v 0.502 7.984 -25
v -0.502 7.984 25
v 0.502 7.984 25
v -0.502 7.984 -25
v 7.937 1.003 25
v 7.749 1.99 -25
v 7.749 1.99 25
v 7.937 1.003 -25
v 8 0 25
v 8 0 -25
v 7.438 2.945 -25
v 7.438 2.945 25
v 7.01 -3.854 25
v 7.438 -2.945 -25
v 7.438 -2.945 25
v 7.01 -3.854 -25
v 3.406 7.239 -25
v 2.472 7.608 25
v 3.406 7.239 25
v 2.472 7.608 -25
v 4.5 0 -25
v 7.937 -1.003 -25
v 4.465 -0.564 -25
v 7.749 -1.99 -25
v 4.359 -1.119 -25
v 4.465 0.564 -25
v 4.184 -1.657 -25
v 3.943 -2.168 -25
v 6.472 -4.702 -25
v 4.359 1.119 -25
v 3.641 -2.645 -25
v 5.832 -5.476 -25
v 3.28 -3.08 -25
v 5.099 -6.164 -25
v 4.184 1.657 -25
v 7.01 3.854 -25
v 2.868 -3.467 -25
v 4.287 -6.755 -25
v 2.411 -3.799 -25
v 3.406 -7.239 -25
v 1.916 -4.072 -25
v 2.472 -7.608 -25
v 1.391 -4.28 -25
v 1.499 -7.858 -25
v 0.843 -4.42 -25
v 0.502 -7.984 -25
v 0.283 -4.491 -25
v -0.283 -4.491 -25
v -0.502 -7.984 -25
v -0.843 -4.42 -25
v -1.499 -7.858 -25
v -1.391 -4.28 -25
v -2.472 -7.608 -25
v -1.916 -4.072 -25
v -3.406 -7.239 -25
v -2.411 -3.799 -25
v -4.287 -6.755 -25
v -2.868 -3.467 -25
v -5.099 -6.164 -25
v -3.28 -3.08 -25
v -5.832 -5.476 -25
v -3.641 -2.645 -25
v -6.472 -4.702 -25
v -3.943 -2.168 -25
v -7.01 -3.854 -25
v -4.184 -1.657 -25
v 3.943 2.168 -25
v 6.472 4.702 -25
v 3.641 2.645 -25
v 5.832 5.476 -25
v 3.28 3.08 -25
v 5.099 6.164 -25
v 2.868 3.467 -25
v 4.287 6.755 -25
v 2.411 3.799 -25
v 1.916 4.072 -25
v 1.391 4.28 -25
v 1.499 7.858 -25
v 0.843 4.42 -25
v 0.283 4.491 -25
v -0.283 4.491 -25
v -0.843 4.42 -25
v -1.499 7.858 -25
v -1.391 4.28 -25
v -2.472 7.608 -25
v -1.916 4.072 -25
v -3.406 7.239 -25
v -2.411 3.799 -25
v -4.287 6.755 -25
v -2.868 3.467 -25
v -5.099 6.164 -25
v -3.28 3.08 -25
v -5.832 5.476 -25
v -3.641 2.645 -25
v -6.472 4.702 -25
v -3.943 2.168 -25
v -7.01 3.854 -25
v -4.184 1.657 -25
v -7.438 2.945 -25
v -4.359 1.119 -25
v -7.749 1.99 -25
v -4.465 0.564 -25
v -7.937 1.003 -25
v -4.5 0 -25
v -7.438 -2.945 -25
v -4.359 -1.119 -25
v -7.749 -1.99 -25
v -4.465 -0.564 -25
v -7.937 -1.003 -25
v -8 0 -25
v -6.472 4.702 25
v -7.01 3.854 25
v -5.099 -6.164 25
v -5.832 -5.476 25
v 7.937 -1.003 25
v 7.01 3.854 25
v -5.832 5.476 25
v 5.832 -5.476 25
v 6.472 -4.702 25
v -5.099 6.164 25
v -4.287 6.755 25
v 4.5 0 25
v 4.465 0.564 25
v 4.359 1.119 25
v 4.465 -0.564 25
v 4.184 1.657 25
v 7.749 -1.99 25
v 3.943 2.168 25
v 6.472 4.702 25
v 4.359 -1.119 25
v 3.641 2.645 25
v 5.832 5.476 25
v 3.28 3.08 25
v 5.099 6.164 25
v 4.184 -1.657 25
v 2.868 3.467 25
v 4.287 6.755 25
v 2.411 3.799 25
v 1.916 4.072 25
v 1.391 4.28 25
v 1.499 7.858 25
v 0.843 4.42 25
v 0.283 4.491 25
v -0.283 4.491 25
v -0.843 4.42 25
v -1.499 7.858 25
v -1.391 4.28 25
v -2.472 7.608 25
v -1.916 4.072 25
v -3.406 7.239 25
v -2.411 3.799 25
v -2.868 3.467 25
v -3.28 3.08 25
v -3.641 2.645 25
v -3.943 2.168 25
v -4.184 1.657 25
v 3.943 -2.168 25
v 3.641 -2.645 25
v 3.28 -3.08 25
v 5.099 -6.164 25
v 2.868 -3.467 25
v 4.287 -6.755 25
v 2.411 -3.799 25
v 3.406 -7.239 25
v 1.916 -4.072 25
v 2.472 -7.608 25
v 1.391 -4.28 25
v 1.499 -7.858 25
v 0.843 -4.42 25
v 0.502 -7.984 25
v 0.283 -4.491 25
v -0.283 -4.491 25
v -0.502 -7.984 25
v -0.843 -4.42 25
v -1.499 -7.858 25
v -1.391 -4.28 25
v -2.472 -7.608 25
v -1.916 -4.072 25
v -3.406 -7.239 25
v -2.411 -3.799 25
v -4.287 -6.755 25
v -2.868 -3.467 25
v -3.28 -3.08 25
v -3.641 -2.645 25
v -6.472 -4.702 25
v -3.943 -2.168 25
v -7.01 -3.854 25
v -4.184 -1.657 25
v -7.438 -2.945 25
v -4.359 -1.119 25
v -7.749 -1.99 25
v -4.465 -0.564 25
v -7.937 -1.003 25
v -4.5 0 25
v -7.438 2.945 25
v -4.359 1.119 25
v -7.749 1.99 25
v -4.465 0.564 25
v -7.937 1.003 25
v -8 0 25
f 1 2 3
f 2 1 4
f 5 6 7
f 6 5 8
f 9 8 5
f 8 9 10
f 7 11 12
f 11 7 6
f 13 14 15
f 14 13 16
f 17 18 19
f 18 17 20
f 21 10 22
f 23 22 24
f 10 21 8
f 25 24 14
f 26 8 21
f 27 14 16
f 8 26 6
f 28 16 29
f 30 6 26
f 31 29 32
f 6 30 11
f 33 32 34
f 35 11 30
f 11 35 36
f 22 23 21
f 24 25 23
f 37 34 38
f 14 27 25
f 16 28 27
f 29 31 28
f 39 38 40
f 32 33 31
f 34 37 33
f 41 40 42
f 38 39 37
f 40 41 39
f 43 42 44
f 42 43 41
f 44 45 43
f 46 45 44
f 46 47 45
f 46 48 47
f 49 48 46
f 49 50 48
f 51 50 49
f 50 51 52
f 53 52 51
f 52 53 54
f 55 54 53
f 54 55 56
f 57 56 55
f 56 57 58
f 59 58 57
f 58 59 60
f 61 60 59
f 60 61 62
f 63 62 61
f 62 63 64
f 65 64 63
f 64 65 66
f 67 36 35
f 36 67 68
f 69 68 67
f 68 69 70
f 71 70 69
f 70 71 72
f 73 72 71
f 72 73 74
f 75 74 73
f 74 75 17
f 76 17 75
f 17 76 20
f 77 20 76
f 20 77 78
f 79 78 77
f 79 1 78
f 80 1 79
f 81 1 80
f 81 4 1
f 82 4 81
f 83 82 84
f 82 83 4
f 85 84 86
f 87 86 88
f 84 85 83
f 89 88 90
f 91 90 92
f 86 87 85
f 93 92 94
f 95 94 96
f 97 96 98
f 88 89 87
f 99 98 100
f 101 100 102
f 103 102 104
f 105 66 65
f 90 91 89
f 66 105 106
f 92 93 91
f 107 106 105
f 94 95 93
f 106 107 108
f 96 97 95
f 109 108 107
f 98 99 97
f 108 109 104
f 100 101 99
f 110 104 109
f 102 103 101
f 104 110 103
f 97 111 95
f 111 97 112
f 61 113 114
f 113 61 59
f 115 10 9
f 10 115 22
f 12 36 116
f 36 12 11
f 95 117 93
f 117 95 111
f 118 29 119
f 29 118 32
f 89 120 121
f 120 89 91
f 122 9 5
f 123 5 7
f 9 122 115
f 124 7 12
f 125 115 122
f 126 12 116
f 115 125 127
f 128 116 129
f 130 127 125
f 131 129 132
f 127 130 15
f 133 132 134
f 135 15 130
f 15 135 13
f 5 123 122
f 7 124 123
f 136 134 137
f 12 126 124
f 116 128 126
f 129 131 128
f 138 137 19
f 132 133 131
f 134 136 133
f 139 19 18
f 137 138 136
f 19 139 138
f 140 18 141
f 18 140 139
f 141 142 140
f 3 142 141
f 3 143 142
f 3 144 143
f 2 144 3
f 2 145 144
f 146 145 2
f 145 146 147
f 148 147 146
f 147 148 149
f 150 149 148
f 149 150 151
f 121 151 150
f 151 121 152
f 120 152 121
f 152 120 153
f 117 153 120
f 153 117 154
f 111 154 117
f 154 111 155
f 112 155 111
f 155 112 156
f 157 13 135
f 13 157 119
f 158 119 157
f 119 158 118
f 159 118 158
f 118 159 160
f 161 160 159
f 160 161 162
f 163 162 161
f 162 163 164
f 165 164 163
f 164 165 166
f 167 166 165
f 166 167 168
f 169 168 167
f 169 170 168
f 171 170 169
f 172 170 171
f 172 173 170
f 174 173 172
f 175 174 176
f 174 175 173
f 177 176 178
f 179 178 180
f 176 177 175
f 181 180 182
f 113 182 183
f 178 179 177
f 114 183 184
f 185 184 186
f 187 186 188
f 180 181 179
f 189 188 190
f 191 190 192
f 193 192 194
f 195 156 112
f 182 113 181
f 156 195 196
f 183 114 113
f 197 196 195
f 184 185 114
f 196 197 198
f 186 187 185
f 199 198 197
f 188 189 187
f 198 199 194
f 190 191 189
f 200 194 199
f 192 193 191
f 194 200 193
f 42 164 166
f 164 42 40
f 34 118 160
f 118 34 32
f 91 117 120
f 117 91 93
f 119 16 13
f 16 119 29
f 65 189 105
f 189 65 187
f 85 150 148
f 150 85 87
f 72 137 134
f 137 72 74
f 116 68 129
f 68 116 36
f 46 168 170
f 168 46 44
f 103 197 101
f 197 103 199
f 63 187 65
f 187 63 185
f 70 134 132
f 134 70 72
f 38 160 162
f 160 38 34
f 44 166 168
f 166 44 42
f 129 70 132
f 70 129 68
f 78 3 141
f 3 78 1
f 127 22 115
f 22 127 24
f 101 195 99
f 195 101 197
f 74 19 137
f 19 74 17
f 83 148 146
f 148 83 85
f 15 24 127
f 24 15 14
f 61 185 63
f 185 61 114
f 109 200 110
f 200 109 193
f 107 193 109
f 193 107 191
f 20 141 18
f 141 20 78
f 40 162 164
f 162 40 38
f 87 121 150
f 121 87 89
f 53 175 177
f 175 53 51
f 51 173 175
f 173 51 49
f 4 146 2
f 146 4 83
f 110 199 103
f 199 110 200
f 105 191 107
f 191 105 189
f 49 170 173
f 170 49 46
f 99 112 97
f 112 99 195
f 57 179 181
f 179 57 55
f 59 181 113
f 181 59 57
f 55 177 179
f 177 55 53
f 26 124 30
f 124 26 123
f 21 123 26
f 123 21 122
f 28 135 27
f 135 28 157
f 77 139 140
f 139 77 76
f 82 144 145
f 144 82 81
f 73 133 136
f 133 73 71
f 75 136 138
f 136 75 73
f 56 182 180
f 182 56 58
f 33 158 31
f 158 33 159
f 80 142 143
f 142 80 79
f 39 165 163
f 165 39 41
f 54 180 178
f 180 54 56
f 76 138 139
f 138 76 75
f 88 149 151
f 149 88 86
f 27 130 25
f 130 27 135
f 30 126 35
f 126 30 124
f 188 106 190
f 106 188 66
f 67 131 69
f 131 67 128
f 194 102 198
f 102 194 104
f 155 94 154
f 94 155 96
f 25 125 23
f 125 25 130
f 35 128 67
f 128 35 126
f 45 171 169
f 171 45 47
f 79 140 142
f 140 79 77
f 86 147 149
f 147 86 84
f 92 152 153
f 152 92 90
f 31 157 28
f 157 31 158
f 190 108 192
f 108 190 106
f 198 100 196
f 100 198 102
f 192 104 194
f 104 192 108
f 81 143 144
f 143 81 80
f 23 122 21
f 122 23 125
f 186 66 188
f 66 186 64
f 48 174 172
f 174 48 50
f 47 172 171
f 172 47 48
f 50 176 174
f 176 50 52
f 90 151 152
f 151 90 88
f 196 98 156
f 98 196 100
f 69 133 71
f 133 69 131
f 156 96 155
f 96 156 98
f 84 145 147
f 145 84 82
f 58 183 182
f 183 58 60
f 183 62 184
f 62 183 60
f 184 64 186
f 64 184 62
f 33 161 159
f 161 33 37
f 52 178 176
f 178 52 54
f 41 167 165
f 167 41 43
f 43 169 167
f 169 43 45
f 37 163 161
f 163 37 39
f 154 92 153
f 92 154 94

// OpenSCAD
$fn = 50;


difference() {
	union() {
		translate(v = [0, 0, -25.0000000000]) {
			cylinder(h = 50, r = 8.0000000000);
		}
	}
	union() {
		translate(v = [0, 0, -100.0000000000]) {
			cylinder(h = 200, r = 4.5000000000);
		}
	}
}
